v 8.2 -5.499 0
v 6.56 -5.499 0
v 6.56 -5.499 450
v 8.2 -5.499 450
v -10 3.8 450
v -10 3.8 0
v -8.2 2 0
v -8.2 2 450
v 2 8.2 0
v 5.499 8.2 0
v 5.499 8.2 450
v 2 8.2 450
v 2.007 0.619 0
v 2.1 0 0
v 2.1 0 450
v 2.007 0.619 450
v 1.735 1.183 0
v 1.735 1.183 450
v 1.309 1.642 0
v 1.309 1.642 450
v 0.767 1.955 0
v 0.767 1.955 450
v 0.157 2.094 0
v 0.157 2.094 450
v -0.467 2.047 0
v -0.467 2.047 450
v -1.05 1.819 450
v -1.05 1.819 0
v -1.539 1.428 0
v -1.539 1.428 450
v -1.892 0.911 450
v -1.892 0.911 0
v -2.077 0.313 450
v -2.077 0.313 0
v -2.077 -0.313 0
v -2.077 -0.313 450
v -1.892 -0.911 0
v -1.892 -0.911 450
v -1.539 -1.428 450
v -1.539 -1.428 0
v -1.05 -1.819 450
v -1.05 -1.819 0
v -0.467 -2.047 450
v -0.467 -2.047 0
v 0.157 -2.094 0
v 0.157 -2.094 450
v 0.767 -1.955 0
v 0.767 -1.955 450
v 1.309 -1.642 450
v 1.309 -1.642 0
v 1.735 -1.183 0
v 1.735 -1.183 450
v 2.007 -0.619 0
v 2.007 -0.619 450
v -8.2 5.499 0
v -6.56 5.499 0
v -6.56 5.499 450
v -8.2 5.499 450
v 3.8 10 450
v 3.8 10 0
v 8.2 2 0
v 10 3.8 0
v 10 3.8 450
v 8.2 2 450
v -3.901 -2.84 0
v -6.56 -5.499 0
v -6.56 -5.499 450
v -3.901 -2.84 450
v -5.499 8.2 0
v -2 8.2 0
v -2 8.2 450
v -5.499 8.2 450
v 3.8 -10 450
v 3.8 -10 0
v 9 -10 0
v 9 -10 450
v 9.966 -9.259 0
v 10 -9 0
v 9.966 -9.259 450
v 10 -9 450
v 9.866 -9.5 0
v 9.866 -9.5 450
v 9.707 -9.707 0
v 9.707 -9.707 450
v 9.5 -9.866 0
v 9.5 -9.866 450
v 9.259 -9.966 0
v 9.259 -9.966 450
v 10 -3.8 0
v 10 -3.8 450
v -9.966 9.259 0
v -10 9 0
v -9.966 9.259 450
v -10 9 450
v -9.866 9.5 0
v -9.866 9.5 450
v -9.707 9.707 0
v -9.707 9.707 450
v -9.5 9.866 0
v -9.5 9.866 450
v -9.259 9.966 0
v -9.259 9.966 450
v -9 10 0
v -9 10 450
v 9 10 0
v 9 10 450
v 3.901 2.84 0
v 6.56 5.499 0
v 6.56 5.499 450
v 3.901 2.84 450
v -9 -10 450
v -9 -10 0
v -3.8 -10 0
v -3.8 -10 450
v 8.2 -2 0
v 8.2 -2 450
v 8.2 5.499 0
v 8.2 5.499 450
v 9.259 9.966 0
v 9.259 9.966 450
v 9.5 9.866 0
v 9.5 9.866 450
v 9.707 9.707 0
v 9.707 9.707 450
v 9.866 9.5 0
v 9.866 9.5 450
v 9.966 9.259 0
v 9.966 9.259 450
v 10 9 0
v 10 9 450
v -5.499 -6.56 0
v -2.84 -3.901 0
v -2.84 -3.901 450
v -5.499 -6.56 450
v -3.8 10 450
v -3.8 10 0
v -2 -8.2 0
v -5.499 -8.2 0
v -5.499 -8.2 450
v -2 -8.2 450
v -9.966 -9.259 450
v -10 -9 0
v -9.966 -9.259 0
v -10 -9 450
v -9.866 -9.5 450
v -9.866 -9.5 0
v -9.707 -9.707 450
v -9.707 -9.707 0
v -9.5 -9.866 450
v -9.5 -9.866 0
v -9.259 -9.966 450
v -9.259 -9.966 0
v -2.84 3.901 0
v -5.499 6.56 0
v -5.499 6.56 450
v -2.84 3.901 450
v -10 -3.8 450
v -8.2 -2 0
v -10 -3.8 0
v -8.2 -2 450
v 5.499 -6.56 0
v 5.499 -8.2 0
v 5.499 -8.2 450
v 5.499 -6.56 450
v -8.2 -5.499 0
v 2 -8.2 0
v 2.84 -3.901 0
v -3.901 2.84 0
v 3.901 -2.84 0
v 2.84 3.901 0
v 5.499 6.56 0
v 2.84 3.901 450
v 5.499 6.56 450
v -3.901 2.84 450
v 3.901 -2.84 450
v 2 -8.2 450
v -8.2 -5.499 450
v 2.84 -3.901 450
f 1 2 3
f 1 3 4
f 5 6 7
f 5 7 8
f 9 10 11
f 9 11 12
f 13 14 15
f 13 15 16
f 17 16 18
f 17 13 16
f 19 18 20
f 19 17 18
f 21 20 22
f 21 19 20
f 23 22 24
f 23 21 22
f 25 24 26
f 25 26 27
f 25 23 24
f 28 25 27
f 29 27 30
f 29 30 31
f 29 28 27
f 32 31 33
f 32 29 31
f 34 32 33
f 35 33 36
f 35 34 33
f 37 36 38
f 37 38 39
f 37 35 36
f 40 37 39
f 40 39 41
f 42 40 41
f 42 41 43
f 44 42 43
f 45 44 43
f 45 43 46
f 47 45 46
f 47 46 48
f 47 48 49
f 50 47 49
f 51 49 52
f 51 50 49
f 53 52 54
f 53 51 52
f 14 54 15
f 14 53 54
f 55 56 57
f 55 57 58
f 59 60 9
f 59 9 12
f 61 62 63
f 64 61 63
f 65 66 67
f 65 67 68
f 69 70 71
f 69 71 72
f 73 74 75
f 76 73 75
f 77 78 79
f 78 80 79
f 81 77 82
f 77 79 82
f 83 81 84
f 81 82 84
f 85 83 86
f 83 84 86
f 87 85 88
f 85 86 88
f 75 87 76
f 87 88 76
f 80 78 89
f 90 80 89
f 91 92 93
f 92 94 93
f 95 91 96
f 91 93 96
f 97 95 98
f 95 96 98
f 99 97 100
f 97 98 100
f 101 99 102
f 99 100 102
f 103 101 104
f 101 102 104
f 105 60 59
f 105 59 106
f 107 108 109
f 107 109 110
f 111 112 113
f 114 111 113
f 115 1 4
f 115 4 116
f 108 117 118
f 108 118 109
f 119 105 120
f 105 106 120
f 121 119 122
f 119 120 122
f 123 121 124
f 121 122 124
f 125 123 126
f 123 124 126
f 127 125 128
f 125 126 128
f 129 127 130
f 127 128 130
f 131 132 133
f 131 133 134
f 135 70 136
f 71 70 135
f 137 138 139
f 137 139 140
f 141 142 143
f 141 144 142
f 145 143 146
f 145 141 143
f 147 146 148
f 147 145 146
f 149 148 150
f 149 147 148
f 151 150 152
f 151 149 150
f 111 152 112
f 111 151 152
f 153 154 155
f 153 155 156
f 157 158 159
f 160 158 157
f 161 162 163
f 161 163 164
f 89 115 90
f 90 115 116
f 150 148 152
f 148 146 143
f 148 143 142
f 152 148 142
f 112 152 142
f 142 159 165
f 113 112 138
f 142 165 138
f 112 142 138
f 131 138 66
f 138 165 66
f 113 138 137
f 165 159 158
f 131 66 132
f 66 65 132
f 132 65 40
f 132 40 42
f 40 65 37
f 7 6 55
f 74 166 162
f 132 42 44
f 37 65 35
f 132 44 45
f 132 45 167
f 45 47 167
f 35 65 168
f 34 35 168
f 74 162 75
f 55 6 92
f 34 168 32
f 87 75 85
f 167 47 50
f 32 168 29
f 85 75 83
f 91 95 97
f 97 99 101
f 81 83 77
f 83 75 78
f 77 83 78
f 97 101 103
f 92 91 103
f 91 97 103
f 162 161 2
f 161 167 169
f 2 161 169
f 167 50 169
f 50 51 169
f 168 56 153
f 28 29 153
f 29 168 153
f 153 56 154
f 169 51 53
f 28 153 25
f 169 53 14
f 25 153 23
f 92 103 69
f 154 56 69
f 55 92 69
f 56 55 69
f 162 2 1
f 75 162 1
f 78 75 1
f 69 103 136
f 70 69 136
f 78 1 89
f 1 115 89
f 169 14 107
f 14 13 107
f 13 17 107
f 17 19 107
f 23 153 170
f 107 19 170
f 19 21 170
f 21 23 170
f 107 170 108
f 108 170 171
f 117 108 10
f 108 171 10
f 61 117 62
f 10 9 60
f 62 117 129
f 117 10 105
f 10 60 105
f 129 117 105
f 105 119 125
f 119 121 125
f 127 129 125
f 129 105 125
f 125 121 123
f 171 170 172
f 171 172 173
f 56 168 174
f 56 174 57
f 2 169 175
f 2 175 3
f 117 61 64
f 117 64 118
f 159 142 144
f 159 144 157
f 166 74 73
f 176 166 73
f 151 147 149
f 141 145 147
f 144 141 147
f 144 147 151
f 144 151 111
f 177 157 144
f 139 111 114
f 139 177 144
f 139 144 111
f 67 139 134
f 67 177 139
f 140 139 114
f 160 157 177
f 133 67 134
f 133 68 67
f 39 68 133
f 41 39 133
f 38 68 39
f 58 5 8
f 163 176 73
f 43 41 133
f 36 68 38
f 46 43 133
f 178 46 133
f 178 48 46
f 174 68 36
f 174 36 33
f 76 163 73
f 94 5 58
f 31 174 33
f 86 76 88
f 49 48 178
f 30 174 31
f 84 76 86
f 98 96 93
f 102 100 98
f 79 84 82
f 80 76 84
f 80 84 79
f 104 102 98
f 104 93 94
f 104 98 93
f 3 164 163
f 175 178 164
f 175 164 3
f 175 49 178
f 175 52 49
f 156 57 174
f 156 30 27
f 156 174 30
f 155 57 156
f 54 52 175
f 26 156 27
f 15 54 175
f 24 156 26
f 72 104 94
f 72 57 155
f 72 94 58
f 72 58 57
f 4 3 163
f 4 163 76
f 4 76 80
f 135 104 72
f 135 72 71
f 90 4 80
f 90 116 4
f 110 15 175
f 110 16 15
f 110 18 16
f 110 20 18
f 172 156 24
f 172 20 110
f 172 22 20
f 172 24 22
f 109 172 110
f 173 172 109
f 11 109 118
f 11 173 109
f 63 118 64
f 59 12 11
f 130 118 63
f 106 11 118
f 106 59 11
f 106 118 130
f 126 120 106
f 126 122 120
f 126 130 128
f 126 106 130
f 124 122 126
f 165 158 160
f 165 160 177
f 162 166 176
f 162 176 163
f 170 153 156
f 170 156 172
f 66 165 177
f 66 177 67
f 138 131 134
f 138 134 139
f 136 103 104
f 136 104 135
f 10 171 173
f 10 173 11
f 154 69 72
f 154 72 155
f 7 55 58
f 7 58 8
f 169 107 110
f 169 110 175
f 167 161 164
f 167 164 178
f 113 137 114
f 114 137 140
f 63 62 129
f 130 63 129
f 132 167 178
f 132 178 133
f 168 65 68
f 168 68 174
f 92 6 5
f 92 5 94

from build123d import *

# Parameters (mm, degrees)
SKETCH1_W           = 20
SKETCH1_H           = 20
SKETCH1_R           = 2.1
BOSS_EXTRUDE1_DEPTH = 450
CUT_EXTRUDE1_DEPTH  = 451.22216738
FILLET1_R           = 1
CHAMFER1_SIZE       = 1.8


with BuildPart() as part:
    # Sketch1 → Boss-Extrude1 (new body)
    with BuildSketch(Plane.XY):
        Rectangle(SKETCH1_W, SKETCH1_H)
        Circle(SKETCH1_R, mode=Mode.SUBTRACT)
    extrude(amount=BOSS_EXTRUDE1_DEPTH)

    # Sketch2 → Cut-Extrude1 (cut, through all)
    with BuildSketch(Plane(origin=(0, 0, 0), x_dir=(-1, 0, 0), z_dir=(0, 0, -1))):
        Polygon((-3.900660172, 2.84), (-3.900660172, -2.84), (-6.56, -5.499339828), (-8.2, -5.499339828), (-8.2, -2), (-10, -2), (-10, 2), (-8.2, 2), (-8.2, 5.499339828), (-6.56, 5.499339828), align=None)
        Polygon((5.499339828, 6.56), (2.84, 3.900660172), (-2.84, 3.900660172), (-5.499339828, 6.56), (-5.499339828, 8.2), (-2, 8.2), (-2, 10), (2, 10), (2, 8.2), (5.499339828, 8.2), align=None)
        Polygon((6.56, -5.499339828), (3.900660172, -2.84), (3.900660172, 2.84), (6.56, 5.499339828), (8.2, 5.499339828), (8.2, 2), (10, 2), (10, -2), (8.2, -2), (8.2, -5.499339828), align=None)
        Polygon((-5.499339828, -6.56), (-2.84, -3.900660172), (2.84, -3.900660172), (5.499339828, -6.56), (5.499339828, -8.2), (2, -8.2), (2, -10), (-2, -10), (-2, -8.2), (-5.499339828, -8.2), align=None)
    extrude(amount=-CUT_EXTRUDE1_DEPTH, mode=Mode.SUBTRACT)

    # Fillet1
    fillet1_edges = [part.edges().sort_by_distance(p)[0] for p in [
        (10, -10, 225),
        (-10, -10, 225),
        (-10, 10, 225),
        (10, 10, 225),
    ]]
    fillet(fillet1_edges, radius=FILLET1_R)

    # Chamfer1
    chamfer1_edges = [part.edges().sort_by_distance(p)[0] for p in [
        (10, 2, 225),
        (10, -2, 225),
        (2, -10, 225),
        (-2, -10, 225),
        (-10, -2, 225),
        (-10, 2, 225),
        (2, 10, 225),
        (-2, 10, 225),
    ]]
    chamfer(chamfer1_edges, length=CHAMFER1_SIZE - 0.0001)  # a hair under: the kernel refuses the full size


solid = part.part
